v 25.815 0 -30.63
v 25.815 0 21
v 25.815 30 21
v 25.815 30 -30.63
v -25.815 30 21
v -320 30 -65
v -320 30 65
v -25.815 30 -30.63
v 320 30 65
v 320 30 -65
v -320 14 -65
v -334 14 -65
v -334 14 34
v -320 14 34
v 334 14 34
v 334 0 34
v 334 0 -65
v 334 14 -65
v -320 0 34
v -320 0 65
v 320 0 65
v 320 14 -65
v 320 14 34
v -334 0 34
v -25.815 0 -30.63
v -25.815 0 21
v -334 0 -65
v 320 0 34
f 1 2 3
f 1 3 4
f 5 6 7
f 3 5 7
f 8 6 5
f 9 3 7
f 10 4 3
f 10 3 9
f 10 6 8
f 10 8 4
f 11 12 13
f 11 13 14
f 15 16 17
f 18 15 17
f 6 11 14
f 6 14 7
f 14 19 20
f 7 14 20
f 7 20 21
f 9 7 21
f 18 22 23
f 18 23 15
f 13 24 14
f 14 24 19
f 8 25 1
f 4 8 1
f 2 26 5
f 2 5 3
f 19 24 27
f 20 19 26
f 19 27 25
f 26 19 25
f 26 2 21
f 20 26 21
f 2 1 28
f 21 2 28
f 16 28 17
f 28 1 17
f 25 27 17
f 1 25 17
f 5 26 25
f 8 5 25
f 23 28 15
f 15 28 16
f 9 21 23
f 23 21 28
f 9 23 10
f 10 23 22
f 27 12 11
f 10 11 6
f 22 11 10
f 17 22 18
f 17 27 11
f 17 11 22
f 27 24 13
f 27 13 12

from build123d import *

# Parameters (mm, degrees)
SKETCH2_W           = 640
SKETCH2_H           = 130
SKETCH2_W_2         = 51.63
SKETCH2_H_2         = 51.63
BOSS_EXTRUDE1_DEPTH = 30
SKETCH2_5_W         = 14
SKETCH2_5_H         = 99
BOSS_EXTRUDE2_DEPTH = 14


with BuildPart() as part:
    # Sketch2 → Boss-Extrude1 (new body)
    with BuildSketch(Plane(origin=(0, 0, 0), x_dir=(1, 0, 0), z_dir=(0, 1, 0))):
        Rectangle(SKETCH2_W, SKETCH2_H)
        with Locations((0, 4.815)):
            Rectangle(SKETCH2_W_2, SKETCH2_H_2, mode=Mode.SUBTRACT)
    extrude(amount=BOSS_EXTRUDE1_DEPTH)

    # Sketch2<5> → Boss-Extrude2 (add)
    with BuildSketch(Plane(origin=(0, 0, 0), x_dir=(1, 0, 0), z_dir=(0, 1, 0))):
        with Locations((-327, 15.5)):
            Rectangle(SKETCH2_5_W, SKETCH2_5_H)
        with Locations((327, 15.5)):
            Rectangle(SKETCH2_5_W, SKETCH2_5_H)
    extrude(amount=BOSS_EXTRUDE2_DEPTH)


solid = part.part
